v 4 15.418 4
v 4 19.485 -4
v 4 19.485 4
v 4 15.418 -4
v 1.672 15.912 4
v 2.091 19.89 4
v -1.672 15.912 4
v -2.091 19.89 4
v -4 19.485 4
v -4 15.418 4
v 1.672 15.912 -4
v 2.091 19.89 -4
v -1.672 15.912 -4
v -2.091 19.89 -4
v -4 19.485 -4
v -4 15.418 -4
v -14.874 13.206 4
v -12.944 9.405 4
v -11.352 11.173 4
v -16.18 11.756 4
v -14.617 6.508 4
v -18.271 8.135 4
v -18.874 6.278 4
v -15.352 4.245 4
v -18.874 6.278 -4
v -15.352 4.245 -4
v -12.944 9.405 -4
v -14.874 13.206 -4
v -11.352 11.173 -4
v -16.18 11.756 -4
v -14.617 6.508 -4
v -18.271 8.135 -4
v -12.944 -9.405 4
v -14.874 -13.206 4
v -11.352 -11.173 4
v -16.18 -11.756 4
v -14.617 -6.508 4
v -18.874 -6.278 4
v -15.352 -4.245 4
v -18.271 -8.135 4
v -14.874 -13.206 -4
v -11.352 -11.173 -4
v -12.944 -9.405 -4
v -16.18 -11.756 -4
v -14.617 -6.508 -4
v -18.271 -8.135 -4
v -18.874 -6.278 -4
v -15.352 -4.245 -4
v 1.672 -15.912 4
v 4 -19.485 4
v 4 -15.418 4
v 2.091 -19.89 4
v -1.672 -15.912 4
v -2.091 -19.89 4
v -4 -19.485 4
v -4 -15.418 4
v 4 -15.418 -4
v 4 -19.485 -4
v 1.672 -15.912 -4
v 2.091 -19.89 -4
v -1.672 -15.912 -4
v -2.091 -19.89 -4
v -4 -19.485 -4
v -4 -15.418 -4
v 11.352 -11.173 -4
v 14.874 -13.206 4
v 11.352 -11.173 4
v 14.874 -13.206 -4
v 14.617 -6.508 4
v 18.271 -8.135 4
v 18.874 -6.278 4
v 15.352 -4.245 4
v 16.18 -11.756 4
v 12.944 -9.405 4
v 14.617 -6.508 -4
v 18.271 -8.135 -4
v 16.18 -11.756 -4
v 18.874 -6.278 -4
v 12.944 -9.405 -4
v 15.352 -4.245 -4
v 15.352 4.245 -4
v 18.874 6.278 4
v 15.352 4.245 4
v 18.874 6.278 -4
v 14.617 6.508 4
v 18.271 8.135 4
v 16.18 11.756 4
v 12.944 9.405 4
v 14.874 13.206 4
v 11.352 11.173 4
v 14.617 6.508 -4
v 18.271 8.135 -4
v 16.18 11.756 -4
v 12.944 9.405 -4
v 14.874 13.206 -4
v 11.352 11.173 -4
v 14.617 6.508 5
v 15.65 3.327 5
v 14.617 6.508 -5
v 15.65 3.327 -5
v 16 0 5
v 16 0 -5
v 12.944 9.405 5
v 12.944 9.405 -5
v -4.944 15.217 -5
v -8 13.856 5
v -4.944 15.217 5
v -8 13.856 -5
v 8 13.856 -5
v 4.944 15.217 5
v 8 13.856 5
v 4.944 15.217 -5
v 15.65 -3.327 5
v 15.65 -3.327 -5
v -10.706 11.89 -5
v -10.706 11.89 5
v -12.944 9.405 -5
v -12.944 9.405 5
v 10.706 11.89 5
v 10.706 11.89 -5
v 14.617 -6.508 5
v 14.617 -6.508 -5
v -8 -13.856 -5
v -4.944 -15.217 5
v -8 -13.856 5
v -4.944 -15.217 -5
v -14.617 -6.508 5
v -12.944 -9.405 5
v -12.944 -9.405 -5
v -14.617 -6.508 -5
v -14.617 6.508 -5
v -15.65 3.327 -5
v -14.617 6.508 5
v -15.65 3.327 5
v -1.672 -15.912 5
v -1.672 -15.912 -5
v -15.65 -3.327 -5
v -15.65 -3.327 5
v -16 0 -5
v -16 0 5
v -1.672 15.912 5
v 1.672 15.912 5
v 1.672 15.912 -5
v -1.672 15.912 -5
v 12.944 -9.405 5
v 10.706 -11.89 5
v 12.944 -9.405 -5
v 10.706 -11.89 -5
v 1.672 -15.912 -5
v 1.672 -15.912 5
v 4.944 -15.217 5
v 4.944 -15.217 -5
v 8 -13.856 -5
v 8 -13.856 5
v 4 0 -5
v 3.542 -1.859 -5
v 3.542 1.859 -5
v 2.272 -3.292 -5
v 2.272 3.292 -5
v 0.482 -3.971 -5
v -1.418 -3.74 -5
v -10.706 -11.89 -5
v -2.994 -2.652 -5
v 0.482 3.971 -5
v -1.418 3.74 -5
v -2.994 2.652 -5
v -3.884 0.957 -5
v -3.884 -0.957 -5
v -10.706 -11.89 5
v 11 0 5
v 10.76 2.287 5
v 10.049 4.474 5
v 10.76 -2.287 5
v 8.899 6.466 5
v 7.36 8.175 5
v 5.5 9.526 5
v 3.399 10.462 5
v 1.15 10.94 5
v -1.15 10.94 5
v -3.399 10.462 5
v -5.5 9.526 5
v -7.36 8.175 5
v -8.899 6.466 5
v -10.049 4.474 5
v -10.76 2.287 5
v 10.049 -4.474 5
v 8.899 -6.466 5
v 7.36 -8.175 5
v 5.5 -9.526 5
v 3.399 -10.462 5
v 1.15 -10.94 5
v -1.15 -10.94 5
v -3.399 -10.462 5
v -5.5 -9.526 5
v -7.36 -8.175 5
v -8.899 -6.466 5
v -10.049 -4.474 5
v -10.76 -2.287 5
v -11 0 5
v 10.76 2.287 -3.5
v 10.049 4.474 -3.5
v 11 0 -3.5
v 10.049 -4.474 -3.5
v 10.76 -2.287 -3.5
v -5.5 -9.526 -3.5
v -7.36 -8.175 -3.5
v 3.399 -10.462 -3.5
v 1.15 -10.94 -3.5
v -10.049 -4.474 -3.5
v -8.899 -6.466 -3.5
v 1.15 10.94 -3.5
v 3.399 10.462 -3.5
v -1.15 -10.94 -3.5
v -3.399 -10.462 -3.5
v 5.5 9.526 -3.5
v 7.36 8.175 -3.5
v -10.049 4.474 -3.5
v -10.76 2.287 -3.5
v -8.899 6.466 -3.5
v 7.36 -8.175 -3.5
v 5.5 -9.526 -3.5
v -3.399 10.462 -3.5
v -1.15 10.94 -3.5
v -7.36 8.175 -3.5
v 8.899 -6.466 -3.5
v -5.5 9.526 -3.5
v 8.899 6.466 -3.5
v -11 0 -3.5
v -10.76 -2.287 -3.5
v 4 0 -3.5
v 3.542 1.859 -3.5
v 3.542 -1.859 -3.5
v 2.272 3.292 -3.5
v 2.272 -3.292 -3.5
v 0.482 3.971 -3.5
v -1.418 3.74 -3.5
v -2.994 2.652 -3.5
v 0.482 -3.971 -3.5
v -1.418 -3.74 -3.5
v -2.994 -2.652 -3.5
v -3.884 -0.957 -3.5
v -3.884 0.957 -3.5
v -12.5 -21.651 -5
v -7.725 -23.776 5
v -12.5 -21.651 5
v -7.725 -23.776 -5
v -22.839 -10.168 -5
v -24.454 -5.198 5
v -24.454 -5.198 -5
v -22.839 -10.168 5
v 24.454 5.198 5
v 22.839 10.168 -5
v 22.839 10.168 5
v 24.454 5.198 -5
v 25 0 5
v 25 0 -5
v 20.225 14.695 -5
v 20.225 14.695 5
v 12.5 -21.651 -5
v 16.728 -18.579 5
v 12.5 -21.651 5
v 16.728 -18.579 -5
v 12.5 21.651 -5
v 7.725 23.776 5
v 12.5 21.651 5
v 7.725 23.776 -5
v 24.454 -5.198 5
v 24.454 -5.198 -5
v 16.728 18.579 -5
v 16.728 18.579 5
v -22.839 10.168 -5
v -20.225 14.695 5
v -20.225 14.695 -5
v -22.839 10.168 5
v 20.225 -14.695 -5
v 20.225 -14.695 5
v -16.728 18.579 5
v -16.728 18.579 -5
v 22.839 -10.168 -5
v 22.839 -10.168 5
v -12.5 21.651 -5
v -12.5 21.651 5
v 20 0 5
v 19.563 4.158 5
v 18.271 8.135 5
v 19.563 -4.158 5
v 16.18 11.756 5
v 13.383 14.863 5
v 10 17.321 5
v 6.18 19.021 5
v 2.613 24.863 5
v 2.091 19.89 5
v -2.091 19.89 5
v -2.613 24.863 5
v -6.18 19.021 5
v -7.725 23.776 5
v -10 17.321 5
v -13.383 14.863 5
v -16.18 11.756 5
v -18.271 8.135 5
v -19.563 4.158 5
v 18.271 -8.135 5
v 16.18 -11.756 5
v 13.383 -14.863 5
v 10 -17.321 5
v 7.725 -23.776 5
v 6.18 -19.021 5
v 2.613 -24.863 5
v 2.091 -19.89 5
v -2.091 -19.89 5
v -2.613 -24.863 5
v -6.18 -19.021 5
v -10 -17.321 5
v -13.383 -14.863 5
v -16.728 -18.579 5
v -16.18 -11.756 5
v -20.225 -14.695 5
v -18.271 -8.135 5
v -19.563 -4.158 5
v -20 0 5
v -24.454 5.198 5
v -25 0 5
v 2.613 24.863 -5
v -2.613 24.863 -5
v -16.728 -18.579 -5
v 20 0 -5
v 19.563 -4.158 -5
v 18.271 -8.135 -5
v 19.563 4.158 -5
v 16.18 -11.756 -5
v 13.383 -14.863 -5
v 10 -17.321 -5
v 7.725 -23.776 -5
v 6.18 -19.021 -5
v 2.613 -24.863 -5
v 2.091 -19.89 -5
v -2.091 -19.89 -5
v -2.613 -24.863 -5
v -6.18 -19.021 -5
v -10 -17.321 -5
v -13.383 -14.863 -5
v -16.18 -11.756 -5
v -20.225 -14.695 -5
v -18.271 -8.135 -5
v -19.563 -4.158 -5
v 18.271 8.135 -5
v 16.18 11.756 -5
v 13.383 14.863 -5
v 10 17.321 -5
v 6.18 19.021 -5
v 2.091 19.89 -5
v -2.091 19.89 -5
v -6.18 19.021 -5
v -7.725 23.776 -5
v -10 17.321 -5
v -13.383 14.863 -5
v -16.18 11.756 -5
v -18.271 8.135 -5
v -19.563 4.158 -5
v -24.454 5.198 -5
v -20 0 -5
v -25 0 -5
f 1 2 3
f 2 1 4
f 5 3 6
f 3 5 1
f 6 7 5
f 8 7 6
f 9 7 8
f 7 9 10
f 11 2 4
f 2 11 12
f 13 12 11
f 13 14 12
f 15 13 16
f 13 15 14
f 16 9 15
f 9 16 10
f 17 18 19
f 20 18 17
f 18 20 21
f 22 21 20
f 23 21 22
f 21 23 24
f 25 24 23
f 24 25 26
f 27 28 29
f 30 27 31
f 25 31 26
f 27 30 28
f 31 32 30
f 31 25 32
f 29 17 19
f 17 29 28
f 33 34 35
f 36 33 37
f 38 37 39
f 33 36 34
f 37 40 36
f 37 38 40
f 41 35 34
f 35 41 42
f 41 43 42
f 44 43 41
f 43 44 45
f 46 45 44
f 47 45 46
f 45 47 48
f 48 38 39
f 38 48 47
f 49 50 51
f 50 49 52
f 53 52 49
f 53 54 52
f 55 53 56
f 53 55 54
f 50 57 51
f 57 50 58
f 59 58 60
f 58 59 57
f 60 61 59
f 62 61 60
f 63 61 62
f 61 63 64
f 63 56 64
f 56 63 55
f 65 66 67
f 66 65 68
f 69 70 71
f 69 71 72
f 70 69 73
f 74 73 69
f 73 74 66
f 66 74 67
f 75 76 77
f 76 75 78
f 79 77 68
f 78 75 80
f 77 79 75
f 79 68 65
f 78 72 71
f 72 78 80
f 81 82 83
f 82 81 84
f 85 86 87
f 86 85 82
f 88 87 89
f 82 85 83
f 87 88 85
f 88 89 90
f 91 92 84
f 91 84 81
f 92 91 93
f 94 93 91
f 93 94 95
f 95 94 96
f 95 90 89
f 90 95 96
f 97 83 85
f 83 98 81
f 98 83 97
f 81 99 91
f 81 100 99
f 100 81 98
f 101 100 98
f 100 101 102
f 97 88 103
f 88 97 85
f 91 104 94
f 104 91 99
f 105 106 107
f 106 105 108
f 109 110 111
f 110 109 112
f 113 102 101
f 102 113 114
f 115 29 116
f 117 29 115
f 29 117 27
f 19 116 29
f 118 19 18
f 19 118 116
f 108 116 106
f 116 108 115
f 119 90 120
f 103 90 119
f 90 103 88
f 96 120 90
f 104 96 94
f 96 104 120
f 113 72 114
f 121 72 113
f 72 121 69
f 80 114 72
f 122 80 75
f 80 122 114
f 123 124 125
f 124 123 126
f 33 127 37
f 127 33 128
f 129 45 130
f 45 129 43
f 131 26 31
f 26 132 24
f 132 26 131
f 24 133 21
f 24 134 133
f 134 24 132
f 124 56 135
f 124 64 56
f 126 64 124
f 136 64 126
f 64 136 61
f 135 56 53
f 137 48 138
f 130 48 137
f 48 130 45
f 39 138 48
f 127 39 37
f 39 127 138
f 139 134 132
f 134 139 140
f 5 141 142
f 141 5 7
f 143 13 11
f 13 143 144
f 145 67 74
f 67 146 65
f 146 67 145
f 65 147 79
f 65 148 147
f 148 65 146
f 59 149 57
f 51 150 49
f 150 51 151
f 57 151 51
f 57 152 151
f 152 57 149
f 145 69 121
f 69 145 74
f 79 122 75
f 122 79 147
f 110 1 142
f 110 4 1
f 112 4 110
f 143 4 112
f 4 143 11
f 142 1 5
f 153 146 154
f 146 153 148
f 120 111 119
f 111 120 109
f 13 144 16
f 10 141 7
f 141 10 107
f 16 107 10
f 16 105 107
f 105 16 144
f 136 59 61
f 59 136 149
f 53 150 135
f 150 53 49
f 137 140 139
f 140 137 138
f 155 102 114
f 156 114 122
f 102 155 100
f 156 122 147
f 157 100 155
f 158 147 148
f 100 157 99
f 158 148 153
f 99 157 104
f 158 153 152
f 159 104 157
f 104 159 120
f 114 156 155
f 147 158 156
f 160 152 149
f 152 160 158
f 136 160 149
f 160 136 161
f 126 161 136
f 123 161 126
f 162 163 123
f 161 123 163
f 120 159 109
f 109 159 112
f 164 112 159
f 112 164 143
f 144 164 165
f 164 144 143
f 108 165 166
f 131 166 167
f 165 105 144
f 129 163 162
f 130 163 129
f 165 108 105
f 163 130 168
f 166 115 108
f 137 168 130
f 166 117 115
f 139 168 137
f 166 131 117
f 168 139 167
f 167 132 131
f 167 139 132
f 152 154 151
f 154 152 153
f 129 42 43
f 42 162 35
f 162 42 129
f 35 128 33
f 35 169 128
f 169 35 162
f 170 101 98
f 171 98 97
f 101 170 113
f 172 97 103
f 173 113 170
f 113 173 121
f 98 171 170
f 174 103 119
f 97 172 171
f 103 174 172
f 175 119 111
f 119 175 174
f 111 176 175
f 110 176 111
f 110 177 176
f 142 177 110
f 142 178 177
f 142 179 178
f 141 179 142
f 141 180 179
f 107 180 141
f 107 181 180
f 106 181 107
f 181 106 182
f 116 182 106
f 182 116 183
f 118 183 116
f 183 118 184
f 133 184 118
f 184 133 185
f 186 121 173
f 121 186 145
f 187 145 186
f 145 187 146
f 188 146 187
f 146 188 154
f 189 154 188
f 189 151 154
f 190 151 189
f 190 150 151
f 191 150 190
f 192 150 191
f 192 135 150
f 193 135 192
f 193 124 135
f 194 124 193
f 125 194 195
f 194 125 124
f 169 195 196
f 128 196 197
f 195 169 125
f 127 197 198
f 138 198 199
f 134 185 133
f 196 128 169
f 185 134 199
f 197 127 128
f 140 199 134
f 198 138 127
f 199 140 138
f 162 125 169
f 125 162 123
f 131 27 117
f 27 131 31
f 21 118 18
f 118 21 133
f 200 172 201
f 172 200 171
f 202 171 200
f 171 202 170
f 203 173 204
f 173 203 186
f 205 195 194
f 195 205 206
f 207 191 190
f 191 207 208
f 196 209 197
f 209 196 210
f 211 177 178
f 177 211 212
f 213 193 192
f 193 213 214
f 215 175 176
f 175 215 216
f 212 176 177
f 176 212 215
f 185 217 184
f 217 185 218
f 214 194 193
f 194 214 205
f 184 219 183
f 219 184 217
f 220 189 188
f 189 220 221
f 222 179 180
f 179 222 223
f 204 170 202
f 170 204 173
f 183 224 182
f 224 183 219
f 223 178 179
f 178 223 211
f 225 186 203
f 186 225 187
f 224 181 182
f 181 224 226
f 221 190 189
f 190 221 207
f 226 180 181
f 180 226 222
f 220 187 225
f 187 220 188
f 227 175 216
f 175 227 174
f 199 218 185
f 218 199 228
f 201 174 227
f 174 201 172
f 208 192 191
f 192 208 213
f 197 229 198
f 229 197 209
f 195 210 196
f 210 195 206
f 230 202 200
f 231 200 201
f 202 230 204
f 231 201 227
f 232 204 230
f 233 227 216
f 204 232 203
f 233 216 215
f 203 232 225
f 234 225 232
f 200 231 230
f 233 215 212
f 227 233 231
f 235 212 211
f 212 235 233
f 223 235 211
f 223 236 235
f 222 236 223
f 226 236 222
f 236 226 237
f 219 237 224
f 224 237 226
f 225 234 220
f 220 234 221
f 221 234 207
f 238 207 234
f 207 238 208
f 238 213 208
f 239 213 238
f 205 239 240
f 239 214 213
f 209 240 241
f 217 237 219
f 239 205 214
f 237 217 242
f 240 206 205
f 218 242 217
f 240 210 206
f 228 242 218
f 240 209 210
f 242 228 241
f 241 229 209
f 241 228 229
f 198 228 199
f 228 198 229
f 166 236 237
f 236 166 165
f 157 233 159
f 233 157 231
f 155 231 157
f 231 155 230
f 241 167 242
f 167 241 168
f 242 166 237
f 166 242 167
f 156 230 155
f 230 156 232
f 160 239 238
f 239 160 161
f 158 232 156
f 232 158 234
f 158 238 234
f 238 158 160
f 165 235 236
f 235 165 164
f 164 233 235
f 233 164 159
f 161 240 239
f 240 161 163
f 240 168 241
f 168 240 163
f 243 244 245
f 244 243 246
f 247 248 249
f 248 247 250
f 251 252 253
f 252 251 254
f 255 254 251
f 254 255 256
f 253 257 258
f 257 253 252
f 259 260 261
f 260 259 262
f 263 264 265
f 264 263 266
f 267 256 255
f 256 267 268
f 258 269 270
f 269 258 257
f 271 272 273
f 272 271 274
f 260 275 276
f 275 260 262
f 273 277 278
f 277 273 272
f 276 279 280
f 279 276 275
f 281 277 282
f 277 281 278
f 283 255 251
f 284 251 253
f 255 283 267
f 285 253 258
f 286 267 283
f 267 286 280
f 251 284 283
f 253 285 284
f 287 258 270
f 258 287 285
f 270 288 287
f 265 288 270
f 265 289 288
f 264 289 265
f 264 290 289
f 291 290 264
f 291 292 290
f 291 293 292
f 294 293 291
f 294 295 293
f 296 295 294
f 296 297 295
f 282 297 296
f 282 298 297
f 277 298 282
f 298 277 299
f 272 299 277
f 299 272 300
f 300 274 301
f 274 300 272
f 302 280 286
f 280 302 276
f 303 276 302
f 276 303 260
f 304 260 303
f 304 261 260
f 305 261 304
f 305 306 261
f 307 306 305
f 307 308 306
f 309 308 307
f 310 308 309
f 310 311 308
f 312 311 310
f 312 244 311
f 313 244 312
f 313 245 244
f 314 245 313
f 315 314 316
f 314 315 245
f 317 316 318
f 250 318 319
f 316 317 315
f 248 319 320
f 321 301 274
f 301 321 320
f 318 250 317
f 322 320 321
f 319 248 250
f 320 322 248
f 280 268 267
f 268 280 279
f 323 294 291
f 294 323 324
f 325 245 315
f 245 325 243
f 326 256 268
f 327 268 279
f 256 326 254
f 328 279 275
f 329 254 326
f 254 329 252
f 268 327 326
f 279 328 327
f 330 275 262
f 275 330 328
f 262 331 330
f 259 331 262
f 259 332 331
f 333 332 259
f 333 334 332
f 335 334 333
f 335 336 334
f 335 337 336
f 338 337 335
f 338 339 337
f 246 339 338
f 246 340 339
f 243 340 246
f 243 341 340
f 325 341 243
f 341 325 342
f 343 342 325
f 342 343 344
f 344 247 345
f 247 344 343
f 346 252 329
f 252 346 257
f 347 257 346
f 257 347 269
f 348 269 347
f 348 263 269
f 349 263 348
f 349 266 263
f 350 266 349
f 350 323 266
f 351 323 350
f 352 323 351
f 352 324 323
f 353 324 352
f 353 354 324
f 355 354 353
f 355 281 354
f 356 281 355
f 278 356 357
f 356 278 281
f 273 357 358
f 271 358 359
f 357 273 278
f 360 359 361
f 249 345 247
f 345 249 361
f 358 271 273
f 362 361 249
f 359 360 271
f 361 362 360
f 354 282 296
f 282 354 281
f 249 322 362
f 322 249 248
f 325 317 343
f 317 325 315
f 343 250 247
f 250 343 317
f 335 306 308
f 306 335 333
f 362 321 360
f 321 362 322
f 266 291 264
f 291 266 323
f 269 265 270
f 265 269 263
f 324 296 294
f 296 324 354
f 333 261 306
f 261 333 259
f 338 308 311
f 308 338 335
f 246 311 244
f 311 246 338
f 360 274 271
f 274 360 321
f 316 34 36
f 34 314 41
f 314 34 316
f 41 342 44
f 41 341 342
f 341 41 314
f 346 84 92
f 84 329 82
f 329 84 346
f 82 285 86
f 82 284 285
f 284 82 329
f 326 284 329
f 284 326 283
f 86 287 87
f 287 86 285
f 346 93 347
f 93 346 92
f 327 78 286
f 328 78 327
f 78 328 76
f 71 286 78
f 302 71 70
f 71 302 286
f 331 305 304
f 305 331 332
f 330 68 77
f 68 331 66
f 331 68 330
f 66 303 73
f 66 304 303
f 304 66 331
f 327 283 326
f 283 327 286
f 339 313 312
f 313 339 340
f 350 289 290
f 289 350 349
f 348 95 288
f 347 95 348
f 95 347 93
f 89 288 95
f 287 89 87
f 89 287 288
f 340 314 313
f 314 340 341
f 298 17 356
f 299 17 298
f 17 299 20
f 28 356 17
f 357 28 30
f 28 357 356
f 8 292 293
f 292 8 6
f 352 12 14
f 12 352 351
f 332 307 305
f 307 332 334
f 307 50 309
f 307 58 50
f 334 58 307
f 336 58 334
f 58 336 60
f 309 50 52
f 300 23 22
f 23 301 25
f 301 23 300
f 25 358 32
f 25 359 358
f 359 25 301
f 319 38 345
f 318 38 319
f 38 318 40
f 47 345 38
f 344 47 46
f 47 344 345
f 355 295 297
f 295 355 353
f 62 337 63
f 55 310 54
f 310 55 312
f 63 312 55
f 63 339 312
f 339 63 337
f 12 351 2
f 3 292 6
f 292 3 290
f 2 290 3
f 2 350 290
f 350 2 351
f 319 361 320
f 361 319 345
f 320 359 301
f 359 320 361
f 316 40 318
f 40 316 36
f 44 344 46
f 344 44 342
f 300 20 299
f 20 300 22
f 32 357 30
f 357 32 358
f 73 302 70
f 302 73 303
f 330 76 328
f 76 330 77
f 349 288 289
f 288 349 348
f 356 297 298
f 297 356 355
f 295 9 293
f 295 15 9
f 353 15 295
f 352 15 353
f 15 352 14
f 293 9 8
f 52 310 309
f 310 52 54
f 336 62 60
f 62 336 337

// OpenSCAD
diametro=50;
grosor=5;
eje=8;
diametrorodamiento=22;
anchorodamiento=7;
anchorueda=10;
anchoradio=8;
grosorradio=8;
numeroradios=6;


// RADIOS
for ( i = [0 : numeroradios-1] )
{
rotate( i * 360 / numeroradios, [0, 0, 1])
translate([0, 18, 0])
cube(anchoradio,diametro/2-diametrorodamiento/2,grosorradio, center=true);
}


// ARO INTERIOR
difference() {
cylinder(h=anchorueda, r=diametrorodamiento/2+grosor, center=true);
translate ([0,0,-anchorodamiento/2]) cylinder(h=anchorodamiento+2, r=diametrorodamiento/2);
cylinder(h=anchorueda+2, r=eje/2,center=true); //agujero eje

}

// ARO EXTERIOR
difference() {
cylinder(h=anchorueda, r=diametro/2, center=true);
translate ([0,0,0]) cylinder(h=anchorueda+2, r=diametro/2-grosor, center=true);
}
